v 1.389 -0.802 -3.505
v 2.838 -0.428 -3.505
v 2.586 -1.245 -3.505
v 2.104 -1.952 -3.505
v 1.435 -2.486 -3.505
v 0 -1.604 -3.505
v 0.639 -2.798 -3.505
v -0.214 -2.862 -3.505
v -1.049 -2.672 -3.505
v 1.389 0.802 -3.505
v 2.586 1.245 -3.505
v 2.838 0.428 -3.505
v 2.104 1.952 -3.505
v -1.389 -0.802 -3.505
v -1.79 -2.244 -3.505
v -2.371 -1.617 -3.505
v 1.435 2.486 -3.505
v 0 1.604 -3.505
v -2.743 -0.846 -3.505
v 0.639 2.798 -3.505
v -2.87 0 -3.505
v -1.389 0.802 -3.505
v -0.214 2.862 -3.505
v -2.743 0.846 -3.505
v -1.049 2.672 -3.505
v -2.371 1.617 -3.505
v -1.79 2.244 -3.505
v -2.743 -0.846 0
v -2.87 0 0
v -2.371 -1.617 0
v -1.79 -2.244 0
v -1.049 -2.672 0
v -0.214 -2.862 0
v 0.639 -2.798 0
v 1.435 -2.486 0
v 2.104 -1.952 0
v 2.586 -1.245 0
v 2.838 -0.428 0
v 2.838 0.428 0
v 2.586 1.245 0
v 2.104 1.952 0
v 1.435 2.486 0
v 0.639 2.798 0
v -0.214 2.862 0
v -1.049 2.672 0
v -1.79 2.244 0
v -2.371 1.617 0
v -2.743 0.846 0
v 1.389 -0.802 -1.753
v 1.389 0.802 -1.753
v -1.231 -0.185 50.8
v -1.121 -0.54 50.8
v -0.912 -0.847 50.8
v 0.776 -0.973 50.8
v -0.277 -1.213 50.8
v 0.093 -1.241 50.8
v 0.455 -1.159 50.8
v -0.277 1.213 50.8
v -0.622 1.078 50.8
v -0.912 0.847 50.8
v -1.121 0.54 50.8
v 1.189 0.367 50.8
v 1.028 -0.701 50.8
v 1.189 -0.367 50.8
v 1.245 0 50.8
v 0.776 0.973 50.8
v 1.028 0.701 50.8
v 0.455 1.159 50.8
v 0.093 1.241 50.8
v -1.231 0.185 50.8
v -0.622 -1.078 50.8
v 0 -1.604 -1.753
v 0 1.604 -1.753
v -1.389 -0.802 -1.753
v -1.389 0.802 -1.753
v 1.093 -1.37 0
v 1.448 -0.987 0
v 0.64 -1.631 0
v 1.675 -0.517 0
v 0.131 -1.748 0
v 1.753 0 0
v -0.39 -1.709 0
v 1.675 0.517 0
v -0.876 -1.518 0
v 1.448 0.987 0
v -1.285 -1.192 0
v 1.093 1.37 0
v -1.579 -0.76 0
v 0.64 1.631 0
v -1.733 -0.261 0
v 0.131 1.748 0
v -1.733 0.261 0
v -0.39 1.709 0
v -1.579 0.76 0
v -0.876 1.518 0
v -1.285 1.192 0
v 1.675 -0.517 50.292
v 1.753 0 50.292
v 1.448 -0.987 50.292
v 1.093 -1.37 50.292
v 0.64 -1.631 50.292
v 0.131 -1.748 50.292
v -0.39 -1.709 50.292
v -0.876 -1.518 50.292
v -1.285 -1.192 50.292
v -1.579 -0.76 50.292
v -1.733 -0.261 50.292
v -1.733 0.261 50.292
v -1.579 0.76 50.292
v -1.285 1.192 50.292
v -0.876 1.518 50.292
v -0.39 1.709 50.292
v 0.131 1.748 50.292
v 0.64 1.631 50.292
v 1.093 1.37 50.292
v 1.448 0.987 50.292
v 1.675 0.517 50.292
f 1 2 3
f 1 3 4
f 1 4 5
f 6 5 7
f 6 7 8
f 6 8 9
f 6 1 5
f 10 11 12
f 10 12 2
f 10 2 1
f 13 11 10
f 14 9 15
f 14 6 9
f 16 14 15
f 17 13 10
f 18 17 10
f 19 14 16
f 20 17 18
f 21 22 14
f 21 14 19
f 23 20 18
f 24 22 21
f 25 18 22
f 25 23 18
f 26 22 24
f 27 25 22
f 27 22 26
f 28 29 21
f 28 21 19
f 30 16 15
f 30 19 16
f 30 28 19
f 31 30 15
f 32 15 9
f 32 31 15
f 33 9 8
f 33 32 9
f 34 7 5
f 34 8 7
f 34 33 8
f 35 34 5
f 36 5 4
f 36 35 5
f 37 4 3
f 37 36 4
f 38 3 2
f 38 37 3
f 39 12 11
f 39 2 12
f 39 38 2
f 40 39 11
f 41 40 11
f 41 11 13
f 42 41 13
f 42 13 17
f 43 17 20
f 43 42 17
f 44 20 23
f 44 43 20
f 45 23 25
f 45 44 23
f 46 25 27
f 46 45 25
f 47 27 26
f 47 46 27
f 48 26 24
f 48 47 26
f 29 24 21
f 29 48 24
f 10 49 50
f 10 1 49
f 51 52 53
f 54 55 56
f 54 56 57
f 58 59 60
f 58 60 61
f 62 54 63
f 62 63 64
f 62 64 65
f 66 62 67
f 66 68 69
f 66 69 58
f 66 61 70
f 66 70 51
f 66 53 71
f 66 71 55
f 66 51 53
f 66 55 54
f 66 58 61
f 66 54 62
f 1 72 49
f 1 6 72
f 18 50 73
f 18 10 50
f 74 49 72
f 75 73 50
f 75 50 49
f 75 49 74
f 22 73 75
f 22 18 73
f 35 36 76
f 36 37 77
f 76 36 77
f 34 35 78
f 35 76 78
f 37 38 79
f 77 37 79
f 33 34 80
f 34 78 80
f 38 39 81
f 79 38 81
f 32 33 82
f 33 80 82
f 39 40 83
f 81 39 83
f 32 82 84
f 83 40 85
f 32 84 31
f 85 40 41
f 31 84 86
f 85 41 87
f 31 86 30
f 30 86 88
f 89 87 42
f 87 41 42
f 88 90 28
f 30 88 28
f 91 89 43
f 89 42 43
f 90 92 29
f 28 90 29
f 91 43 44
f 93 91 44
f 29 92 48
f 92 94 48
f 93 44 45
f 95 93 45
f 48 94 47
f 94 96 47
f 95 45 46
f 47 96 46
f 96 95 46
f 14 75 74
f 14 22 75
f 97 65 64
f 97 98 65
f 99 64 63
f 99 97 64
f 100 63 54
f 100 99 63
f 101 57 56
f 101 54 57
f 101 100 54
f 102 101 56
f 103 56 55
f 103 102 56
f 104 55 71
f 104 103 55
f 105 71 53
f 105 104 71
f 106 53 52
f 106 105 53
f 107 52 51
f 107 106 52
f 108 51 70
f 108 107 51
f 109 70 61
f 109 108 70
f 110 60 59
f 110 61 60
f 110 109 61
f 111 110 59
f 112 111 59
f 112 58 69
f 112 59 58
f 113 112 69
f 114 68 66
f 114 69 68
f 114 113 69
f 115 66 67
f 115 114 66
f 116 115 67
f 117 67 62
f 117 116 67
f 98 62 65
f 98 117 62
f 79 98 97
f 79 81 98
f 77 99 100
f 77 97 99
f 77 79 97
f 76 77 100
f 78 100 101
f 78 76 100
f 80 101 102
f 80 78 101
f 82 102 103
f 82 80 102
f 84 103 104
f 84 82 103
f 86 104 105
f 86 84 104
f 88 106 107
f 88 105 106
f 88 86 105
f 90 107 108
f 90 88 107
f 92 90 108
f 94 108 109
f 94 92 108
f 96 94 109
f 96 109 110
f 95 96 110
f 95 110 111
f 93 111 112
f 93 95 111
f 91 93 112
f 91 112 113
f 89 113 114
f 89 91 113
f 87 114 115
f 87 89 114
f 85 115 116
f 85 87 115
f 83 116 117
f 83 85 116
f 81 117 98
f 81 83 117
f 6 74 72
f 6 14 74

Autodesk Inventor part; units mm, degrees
ref_plane "YZ Plane" through (0, 0, 0) normal (1, 0, 0) x (0, 1, 0)
ref_plane "XZ Plane" through (0, 0, 0) normal (0, 1, 0) x (-1, 0, 0)
ref_plane "XY Plane" through (0, 0, 0) normal (0, 0, 1) x (1, 0, 0)
sketch "Sketch1" plane through (0, 0, 0) normal (0, 0, 1) x (1, 0, 0)
  circle A0 centre (0, 0) radius 1.7526
  dimension "d0" = 3.5052
extrude "Extrusion1" add sketch "Sketch1" along normal blind 50.8
sketch "Sketch2" plane through (0, 0, 0) normal (0, 0, -1) x (-1, 0, 0)
  circle A0 centre (0, 0) radius 1.7526 construction
  circle A1 centre (0, 0) radius 2.8702
  dimension "d3" = 5.7404
extrude "Extrusion2" add sketch "Sketch2" along normal blind 3.5052
sketch "Sketch3" plane through (0, 0, -3.5052) normal (0, 0, -1) x (-1, 0, 0)
  circle A0 centre (0, 0) radius 2.8702 projected
  line L0 (0, 1.604) -> (1.3891, 0.802)
  line L1 (1.3891, 0.802) -> (1.3891, -0.802)
  line L2 (1.3891, -0.802) -> (0, -1.604)
  line L3 (0, -1.604) -> (-1.3891, -0.802)
  line L4 (-1.3891, -0.802) -> (-1.3891, 0.802)
  line L5 (-1.3891, 0.802) -> (0, 1.604)
  dimension "d6" = 2.7781
extrude "Extrusion3" cut sketch "Sketch3" against normal blind 1.7526 contours L0 L1 L2 L3 L4 L5
chamfer "Chamfer1" distance 0.508 angle 45 1 edges at (-1.7526, 0, 50.8)
thread "Thread2" size "6-32 UNC" class "2A" standard "ANSI Unified Screw Threads" length 25.4
properties part number "6-32 SHCS x500" material "Stainless Steel"
